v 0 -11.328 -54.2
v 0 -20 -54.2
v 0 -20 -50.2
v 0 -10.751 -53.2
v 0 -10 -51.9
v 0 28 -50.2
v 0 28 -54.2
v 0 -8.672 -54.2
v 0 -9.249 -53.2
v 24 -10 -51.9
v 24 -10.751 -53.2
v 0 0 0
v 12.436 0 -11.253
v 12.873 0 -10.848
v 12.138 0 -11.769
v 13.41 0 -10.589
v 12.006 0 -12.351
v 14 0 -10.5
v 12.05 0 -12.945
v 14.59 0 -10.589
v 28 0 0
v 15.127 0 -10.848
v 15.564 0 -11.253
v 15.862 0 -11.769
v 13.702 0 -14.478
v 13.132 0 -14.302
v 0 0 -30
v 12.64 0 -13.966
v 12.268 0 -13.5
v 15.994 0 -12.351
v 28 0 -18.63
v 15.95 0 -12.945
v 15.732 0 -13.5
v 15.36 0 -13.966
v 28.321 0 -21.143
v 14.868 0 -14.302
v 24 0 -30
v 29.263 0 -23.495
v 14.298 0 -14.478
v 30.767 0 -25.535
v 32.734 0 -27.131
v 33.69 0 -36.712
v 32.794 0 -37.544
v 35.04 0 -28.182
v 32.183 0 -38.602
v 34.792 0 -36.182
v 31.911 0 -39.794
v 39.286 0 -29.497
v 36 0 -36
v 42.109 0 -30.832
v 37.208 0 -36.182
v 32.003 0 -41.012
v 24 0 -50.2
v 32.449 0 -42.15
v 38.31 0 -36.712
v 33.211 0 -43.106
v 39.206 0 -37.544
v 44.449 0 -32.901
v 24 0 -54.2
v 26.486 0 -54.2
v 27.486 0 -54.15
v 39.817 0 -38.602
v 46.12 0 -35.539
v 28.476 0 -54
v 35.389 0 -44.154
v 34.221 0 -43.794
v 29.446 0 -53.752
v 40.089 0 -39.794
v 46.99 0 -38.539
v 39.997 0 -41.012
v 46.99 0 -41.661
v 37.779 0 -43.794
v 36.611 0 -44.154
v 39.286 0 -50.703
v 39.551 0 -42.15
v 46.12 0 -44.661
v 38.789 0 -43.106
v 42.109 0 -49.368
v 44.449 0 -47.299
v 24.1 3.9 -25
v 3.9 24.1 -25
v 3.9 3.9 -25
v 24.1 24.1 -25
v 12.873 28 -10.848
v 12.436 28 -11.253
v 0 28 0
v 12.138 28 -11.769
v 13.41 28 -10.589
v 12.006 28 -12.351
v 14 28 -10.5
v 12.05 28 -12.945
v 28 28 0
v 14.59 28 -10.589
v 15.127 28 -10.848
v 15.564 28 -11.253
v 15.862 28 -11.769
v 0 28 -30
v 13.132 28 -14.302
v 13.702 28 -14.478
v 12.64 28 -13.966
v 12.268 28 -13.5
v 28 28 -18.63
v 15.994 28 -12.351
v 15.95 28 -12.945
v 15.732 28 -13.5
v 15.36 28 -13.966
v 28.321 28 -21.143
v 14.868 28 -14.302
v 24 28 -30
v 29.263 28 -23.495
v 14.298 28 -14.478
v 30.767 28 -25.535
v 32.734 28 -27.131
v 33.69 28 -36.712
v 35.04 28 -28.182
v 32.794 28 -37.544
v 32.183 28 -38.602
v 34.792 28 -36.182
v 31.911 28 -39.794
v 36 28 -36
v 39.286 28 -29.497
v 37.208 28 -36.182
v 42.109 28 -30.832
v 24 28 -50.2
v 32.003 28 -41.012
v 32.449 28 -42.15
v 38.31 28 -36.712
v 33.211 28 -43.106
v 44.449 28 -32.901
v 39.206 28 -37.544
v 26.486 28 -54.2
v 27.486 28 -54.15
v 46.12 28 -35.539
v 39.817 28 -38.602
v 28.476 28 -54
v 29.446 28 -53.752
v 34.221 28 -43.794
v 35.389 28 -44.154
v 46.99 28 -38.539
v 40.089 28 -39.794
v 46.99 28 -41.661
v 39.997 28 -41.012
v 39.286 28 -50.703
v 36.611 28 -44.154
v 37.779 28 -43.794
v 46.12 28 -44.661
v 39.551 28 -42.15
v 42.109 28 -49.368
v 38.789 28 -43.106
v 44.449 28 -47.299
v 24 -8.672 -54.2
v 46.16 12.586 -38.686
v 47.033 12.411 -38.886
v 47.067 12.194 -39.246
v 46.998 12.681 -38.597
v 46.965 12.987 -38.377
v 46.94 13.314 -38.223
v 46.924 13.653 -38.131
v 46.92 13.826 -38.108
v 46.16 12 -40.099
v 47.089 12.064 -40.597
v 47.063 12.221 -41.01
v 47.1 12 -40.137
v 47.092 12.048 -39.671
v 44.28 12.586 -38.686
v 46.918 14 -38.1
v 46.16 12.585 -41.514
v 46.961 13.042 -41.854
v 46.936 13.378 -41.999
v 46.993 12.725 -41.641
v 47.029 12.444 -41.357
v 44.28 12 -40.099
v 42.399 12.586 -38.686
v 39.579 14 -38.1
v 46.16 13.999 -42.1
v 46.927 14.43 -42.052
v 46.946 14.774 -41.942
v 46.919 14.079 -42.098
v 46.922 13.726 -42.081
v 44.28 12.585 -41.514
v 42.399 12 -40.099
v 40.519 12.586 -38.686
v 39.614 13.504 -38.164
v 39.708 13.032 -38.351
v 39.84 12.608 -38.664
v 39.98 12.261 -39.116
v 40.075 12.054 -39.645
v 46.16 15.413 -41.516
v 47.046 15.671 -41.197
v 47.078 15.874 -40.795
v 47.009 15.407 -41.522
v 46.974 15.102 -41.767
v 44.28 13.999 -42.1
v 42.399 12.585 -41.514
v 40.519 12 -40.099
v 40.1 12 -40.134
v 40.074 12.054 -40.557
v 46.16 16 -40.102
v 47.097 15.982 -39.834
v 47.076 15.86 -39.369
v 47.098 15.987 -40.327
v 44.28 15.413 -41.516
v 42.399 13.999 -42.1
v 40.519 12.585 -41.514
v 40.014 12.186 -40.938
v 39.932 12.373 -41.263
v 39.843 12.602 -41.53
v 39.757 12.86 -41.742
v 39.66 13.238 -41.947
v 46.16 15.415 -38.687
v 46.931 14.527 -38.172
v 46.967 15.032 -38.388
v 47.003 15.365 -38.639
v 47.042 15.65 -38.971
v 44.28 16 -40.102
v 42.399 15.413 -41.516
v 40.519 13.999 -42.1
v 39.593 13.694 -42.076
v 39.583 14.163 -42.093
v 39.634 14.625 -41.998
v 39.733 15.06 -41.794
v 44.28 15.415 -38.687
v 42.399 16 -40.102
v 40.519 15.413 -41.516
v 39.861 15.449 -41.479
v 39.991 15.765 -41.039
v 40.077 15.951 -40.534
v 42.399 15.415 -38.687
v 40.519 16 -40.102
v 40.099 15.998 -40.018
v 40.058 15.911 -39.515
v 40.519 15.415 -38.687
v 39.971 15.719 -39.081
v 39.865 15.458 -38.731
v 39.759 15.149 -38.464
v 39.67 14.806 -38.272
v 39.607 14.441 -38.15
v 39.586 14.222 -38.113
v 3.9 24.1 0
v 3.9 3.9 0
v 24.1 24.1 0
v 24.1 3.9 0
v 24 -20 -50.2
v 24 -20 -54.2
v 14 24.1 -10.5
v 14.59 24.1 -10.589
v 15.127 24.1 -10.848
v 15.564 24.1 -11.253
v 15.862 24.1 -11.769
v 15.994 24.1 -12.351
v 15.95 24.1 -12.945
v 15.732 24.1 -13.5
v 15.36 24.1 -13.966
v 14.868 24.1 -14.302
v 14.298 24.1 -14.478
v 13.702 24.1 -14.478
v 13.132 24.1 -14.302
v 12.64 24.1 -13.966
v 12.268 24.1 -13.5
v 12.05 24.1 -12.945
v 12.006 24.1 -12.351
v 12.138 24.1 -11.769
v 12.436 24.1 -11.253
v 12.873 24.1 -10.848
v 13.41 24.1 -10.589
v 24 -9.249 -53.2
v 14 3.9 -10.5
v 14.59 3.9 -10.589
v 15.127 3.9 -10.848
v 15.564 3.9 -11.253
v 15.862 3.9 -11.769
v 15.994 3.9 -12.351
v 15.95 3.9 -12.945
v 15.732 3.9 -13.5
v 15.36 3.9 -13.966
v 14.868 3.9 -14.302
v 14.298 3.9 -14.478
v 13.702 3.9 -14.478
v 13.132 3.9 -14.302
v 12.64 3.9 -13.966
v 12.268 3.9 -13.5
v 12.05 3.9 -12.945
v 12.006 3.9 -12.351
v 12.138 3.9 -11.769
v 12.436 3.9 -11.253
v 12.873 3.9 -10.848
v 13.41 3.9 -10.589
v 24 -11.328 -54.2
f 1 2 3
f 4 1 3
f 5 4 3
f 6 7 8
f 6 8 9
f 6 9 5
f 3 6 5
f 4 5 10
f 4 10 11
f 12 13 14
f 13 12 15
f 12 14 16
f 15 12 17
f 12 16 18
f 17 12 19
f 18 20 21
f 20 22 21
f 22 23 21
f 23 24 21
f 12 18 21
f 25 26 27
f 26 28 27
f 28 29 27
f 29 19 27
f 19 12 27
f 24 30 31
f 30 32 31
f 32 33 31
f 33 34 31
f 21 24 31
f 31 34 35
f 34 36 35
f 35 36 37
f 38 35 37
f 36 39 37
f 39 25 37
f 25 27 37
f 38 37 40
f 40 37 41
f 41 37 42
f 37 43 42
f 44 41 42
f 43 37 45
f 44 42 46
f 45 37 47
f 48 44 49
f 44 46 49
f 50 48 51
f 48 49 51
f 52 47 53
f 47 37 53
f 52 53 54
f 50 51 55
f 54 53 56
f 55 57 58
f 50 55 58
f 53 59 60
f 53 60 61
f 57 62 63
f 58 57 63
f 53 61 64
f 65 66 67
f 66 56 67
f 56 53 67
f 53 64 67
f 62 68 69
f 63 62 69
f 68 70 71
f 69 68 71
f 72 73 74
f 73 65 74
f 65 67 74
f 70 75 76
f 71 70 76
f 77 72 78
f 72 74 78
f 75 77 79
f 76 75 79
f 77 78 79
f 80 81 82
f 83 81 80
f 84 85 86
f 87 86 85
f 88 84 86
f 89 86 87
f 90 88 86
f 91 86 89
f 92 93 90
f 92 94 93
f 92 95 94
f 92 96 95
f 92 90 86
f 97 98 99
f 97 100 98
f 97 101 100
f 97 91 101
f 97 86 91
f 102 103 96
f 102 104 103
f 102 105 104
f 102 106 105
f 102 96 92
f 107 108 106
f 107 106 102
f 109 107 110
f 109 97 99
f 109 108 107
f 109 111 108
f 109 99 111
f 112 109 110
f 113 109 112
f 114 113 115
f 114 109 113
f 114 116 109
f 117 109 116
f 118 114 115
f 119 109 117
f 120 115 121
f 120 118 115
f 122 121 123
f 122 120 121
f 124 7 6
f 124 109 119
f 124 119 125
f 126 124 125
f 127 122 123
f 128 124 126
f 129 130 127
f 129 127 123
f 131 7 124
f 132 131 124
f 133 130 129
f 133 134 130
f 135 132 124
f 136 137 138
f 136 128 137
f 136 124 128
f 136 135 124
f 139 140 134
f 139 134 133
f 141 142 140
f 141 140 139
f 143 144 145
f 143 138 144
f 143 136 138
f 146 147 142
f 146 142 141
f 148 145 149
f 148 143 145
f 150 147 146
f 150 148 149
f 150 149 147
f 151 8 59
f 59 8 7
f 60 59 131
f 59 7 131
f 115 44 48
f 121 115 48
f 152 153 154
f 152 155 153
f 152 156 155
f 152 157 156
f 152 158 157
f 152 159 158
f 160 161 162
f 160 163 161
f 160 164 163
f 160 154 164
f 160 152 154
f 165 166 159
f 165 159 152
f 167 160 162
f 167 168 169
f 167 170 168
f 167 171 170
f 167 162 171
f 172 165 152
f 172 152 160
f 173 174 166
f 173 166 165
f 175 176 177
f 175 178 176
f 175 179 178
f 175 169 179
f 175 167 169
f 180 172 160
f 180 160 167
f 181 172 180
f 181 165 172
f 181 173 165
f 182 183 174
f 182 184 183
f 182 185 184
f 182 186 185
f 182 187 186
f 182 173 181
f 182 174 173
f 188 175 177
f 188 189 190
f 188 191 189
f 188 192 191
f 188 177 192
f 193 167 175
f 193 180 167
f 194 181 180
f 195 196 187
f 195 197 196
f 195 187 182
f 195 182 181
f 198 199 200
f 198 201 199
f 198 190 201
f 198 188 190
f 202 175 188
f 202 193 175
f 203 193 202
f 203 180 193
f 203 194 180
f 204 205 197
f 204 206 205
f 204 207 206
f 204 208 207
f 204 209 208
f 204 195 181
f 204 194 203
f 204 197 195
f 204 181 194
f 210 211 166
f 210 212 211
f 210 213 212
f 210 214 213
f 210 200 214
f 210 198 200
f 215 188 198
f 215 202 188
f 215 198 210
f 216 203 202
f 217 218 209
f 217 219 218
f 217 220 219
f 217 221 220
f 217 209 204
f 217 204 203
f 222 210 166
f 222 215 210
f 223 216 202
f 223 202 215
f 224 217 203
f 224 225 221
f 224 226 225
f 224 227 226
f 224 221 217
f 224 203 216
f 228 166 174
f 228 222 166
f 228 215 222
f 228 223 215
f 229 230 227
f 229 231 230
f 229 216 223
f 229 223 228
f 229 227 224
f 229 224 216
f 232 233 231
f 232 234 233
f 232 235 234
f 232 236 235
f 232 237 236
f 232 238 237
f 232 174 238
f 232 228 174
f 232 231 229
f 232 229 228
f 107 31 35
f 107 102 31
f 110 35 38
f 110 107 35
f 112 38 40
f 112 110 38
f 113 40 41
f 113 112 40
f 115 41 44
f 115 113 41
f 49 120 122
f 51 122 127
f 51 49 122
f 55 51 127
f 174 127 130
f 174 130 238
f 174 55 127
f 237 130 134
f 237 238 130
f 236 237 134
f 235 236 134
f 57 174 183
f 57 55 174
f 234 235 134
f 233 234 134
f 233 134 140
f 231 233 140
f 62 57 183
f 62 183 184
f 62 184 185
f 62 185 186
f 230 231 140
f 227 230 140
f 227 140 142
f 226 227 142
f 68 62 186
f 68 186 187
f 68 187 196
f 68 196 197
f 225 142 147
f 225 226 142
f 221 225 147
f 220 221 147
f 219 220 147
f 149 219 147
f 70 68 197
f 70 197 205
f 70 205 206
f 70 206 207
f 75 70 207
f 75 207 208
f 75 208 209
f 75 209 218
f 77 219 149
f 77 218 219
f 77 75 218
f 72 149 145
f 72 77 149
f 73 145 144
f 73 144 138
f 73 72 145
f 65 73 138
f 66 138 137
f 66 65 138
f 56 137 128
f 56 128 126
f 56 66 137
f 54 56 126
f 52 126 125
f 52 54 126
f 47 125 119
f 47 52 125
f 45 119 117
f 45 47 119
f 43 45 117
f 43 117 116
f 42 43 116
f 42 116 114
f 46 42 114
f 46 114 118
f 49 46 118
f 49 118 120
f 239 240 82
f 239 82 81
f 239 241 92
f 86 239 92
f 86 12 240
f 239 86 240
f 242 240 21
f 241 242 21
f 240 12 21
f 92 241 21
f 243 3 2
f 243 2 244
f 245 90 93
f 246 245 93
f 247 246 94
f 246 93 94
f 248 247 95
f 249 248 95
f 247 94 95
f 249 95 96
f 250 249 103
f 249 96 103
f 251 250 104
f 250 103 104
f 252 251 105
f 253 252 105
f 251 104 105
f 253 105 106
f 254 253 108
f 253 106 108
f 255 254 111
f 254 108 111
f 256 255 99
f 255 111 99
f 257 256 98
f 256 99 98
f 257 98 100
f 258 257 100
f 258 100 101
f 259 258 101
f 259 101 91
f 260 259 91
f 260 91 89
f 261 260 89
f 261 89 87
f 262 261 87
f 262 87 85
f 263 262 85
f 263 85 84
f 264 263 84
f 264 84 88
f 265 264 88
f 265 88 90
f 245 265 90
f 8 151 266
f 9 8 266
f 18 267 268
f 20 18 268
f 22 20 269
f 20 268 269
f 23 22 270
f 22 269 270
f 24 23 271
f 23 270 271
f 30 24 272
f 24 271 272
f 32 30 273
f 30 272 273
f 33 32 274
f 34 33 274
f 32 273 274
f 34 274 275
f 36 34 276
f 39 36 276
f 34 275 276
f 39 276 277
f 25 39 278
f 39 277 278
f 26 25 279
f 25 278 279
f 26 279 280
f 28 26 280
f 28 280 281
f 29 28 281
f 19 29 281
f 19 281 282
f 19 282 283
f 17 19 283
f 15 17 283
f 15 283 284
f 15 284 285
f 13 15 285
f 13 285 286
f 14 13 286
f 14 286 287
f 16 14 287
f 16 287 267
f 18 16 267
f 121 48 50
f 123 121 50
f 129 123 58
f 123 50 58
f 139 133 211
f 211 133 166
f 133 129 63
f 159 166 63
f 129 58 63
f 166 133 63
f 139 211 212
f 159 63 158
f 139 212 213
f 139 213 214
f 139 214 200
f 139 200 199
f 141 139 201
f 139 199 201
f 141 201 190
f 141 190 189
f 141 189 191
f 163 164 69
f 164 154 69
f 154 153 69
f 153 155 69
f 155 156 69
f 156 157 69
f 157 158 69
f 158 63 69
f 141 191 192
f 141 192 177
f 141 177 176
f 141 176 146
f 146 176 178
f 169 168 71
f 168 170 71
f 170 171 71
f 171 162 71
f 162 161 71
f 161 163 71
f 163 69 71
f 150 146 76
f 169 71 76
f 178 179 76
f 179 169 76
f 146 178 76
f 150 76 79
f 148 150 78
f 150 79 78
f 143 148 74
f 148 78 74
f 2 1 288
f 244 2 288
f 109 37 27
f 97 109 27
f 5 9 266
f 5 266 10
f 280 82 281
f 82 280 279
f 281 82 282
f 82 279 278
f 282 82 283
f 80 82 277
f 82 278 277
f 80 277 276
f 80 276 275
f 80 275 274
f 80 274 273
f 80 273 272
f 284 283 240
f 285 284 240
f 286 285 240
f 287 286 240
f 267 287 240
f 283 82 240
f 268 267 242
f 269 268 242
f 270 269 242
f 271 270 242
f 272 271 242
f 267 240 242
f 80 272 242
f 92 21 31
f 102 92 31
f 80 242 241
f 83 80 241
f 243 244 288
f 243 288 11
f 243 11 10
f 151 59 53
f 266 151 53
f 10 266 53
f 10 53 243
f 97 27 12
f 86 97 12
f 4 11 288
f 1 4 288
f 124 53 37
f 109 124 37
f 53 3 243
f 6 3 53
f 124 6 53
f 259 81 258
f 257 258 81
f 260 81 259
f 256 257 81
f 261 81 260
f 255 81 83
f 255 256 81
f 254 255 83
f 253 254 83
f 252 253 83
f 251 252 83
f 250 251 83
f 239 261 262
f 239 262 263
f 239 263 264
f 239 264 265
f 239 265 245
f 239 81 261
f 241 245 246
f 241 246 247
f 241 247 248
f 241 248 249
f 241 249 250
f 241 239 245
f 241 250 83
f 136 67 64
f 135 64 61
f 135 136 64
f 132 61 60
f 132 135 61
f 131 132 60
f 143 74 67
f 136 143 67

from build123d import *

# Parameters (mm, degrees)
SKETCH1_R           = 4.1
BOSS_EXTRUDE1_DEPTH = 28
SKETCH2_W           = 20.2
SKETCH2_H           = 20.2
CUT_EXTRUDE1_DEPTH  = 25
SKETCH3_R           = 2
CUT_EXTRUDE2_DEPTH  = 78.071719846
FILLET1_R           = 10
SKETCH4_W           = 24
SKETCH4_H           = 4
BOSS_EXTRUDE2_DEPTH = 20
CUT_EXTRUDE3_DEPTH  = 66.556387942
CUT_EXTRUDE4_START  = 15.579105931
CUT_EXTRUDE4_DEPTH  = 7.520894069


# Read off the part's stored shape, not the designer's step: Cut-Extrude4
with BuildPart() as part:
    # Sketch1 → Boss-Extrude1 (new body)
    # profile 1 of 2: a face of its own
    with BuildSketch(Plane(origin=(0, 0, 0), x_dir=(1, 0, 0), z_dir=(0, 1, 0))):
        with BuildLine():
            Line((39.285734559, 50.702544431), (28, 54.2))
            Line((28, 54.2), (28, 26))
            Line((28, 26), (39.285734559, 29.497455569))
            ThreePointArc((39.285734559, 29.497455569), (47.1, 40.1), (39.285734559, 50.702544431))
        make_face()
        with Locations(Location((36, 40.1, 0), (0, 0, 270))):
            Circle(SKETCH1_R, mode=Mode.SUBTRACT)
    # profile 2 of 2: a face of its own
    with BuildSketch(Plane(origin=(0, 0, 0), x_dir=(1, 0, 0), z_dir=(0, 1, 0))):
        Polygon((28, 0), (28, 54.2), (0, 54.2), (0, 50.2), (24, 50.2), (24, 30), (0, 30), (0, 0), align=None)
    extrude(amount=BOSS_EXTRUDE1_DEPTH)

    # Sketch2 → Cut-Extrude1 (cut)
    with BuildSketch(Plane.XY):
        with Locations((14, 14)):
            Rectangle(SKETCH2_W, SKETCH2_H)
    extrude(amount=-CUT_EXTRUDE1_DEPTH, mode=Mode.SUBTRACT)

    # Sketch3 → Cut-Extrude2 (cut, through all)
    with BuildSketch(Plane(origin=(0, 28, 0), x_dir=(1, 0, 0), z_dir=(0, 1, 0))):
        with Locations(Location((14, 12.5, 0), (0, 0, 270))):
            Circle(SKETCH3_R)
    extrude(amount=-CUT_EXTRUDE2_DEPTH, mode=Mode.SUBTRACT)

    # Fillet1
    fillet1_edges = [part.edges().sort_by_distance(p)[0] for p in [
        (28, 14, -26),
        (28, 14, -54.2),
    ]]
    fillet(fillet1_edges, radius=FILLET1_R)

    # Sketch4 → Boss-Extrude2 (add)
    with BuildSketch(Plane.XZ):
        with Locations((12, -52.2)):
            Rectangle(SKETCH4_W, SKETCH4_H)
    extrude(amount=BOSS_EXTRUDE2_DEPTH)

    # Sketch5 → Cut-Extrude3 (cut, through all)
    with BuildSketch(Plane(origin=(24, 0, 0), x_dir=(0, 0, -1), z_dir=(1, 0, 0))):
        Polygon((54.2, -11.327905619), (54.2, -8.672094381), (53.2, -9.24944465), (53.2, -10.75055535), align=None)
        Polygon((53.2, -10.75055535), (53.2, -9.24944465), (51.9, -10), align=None)
    extrude(amount=-CUT_EXTRUDE3_DEPTH, mode=Mode.SUBTRACT)

    # Cut-Extrude4 outline → Cut-Extrude4 (cut)
    with BuildSketch(Plane(origin=(24, 0, 0), x_dir=(0, 0, -1), z_dir=(1, 0, 0)).offset(CUT_EXTRUDE4_START)):
        with BuildLine():
            add(Edge.make_bspline(
                [(38.1, 14), (38.1, 13.470320913), (38.317750981, 12.95373695), (39.054148284, 12.217509573), (39.57591962, 12.000304151), (40.621756395, 11.999696524), (41.14157679, 12.213335487), (41.886144514, 12.957531743), (42.099791904, 13.47657128), (42.100207779, 14.521837258), (41.883895964, 15.043849972), (41.147138028, 15.78196788), (40.629992878, 15.999596004), (39.573060585, 16.00040283), (39.055030391, 15.78291354), (38.318631187, 15.047600747), (38.1, 14.529679087), (38.1, 14)],
                knots=[0, 0, 0, 0, 0.125, 0.125, 0.25, 0.25, 0.375, 0.375, 0.5, 0.5, 0.625, 0.625, 0.75, 0.75, 0.875, 0.875, 1, 1, 1, 1], degree=3))
        make_face()
    extrude(amount=CUT_EXTRUDE4_DEPTH, mode=Mode.SUBTRACT)


solid = part.part
